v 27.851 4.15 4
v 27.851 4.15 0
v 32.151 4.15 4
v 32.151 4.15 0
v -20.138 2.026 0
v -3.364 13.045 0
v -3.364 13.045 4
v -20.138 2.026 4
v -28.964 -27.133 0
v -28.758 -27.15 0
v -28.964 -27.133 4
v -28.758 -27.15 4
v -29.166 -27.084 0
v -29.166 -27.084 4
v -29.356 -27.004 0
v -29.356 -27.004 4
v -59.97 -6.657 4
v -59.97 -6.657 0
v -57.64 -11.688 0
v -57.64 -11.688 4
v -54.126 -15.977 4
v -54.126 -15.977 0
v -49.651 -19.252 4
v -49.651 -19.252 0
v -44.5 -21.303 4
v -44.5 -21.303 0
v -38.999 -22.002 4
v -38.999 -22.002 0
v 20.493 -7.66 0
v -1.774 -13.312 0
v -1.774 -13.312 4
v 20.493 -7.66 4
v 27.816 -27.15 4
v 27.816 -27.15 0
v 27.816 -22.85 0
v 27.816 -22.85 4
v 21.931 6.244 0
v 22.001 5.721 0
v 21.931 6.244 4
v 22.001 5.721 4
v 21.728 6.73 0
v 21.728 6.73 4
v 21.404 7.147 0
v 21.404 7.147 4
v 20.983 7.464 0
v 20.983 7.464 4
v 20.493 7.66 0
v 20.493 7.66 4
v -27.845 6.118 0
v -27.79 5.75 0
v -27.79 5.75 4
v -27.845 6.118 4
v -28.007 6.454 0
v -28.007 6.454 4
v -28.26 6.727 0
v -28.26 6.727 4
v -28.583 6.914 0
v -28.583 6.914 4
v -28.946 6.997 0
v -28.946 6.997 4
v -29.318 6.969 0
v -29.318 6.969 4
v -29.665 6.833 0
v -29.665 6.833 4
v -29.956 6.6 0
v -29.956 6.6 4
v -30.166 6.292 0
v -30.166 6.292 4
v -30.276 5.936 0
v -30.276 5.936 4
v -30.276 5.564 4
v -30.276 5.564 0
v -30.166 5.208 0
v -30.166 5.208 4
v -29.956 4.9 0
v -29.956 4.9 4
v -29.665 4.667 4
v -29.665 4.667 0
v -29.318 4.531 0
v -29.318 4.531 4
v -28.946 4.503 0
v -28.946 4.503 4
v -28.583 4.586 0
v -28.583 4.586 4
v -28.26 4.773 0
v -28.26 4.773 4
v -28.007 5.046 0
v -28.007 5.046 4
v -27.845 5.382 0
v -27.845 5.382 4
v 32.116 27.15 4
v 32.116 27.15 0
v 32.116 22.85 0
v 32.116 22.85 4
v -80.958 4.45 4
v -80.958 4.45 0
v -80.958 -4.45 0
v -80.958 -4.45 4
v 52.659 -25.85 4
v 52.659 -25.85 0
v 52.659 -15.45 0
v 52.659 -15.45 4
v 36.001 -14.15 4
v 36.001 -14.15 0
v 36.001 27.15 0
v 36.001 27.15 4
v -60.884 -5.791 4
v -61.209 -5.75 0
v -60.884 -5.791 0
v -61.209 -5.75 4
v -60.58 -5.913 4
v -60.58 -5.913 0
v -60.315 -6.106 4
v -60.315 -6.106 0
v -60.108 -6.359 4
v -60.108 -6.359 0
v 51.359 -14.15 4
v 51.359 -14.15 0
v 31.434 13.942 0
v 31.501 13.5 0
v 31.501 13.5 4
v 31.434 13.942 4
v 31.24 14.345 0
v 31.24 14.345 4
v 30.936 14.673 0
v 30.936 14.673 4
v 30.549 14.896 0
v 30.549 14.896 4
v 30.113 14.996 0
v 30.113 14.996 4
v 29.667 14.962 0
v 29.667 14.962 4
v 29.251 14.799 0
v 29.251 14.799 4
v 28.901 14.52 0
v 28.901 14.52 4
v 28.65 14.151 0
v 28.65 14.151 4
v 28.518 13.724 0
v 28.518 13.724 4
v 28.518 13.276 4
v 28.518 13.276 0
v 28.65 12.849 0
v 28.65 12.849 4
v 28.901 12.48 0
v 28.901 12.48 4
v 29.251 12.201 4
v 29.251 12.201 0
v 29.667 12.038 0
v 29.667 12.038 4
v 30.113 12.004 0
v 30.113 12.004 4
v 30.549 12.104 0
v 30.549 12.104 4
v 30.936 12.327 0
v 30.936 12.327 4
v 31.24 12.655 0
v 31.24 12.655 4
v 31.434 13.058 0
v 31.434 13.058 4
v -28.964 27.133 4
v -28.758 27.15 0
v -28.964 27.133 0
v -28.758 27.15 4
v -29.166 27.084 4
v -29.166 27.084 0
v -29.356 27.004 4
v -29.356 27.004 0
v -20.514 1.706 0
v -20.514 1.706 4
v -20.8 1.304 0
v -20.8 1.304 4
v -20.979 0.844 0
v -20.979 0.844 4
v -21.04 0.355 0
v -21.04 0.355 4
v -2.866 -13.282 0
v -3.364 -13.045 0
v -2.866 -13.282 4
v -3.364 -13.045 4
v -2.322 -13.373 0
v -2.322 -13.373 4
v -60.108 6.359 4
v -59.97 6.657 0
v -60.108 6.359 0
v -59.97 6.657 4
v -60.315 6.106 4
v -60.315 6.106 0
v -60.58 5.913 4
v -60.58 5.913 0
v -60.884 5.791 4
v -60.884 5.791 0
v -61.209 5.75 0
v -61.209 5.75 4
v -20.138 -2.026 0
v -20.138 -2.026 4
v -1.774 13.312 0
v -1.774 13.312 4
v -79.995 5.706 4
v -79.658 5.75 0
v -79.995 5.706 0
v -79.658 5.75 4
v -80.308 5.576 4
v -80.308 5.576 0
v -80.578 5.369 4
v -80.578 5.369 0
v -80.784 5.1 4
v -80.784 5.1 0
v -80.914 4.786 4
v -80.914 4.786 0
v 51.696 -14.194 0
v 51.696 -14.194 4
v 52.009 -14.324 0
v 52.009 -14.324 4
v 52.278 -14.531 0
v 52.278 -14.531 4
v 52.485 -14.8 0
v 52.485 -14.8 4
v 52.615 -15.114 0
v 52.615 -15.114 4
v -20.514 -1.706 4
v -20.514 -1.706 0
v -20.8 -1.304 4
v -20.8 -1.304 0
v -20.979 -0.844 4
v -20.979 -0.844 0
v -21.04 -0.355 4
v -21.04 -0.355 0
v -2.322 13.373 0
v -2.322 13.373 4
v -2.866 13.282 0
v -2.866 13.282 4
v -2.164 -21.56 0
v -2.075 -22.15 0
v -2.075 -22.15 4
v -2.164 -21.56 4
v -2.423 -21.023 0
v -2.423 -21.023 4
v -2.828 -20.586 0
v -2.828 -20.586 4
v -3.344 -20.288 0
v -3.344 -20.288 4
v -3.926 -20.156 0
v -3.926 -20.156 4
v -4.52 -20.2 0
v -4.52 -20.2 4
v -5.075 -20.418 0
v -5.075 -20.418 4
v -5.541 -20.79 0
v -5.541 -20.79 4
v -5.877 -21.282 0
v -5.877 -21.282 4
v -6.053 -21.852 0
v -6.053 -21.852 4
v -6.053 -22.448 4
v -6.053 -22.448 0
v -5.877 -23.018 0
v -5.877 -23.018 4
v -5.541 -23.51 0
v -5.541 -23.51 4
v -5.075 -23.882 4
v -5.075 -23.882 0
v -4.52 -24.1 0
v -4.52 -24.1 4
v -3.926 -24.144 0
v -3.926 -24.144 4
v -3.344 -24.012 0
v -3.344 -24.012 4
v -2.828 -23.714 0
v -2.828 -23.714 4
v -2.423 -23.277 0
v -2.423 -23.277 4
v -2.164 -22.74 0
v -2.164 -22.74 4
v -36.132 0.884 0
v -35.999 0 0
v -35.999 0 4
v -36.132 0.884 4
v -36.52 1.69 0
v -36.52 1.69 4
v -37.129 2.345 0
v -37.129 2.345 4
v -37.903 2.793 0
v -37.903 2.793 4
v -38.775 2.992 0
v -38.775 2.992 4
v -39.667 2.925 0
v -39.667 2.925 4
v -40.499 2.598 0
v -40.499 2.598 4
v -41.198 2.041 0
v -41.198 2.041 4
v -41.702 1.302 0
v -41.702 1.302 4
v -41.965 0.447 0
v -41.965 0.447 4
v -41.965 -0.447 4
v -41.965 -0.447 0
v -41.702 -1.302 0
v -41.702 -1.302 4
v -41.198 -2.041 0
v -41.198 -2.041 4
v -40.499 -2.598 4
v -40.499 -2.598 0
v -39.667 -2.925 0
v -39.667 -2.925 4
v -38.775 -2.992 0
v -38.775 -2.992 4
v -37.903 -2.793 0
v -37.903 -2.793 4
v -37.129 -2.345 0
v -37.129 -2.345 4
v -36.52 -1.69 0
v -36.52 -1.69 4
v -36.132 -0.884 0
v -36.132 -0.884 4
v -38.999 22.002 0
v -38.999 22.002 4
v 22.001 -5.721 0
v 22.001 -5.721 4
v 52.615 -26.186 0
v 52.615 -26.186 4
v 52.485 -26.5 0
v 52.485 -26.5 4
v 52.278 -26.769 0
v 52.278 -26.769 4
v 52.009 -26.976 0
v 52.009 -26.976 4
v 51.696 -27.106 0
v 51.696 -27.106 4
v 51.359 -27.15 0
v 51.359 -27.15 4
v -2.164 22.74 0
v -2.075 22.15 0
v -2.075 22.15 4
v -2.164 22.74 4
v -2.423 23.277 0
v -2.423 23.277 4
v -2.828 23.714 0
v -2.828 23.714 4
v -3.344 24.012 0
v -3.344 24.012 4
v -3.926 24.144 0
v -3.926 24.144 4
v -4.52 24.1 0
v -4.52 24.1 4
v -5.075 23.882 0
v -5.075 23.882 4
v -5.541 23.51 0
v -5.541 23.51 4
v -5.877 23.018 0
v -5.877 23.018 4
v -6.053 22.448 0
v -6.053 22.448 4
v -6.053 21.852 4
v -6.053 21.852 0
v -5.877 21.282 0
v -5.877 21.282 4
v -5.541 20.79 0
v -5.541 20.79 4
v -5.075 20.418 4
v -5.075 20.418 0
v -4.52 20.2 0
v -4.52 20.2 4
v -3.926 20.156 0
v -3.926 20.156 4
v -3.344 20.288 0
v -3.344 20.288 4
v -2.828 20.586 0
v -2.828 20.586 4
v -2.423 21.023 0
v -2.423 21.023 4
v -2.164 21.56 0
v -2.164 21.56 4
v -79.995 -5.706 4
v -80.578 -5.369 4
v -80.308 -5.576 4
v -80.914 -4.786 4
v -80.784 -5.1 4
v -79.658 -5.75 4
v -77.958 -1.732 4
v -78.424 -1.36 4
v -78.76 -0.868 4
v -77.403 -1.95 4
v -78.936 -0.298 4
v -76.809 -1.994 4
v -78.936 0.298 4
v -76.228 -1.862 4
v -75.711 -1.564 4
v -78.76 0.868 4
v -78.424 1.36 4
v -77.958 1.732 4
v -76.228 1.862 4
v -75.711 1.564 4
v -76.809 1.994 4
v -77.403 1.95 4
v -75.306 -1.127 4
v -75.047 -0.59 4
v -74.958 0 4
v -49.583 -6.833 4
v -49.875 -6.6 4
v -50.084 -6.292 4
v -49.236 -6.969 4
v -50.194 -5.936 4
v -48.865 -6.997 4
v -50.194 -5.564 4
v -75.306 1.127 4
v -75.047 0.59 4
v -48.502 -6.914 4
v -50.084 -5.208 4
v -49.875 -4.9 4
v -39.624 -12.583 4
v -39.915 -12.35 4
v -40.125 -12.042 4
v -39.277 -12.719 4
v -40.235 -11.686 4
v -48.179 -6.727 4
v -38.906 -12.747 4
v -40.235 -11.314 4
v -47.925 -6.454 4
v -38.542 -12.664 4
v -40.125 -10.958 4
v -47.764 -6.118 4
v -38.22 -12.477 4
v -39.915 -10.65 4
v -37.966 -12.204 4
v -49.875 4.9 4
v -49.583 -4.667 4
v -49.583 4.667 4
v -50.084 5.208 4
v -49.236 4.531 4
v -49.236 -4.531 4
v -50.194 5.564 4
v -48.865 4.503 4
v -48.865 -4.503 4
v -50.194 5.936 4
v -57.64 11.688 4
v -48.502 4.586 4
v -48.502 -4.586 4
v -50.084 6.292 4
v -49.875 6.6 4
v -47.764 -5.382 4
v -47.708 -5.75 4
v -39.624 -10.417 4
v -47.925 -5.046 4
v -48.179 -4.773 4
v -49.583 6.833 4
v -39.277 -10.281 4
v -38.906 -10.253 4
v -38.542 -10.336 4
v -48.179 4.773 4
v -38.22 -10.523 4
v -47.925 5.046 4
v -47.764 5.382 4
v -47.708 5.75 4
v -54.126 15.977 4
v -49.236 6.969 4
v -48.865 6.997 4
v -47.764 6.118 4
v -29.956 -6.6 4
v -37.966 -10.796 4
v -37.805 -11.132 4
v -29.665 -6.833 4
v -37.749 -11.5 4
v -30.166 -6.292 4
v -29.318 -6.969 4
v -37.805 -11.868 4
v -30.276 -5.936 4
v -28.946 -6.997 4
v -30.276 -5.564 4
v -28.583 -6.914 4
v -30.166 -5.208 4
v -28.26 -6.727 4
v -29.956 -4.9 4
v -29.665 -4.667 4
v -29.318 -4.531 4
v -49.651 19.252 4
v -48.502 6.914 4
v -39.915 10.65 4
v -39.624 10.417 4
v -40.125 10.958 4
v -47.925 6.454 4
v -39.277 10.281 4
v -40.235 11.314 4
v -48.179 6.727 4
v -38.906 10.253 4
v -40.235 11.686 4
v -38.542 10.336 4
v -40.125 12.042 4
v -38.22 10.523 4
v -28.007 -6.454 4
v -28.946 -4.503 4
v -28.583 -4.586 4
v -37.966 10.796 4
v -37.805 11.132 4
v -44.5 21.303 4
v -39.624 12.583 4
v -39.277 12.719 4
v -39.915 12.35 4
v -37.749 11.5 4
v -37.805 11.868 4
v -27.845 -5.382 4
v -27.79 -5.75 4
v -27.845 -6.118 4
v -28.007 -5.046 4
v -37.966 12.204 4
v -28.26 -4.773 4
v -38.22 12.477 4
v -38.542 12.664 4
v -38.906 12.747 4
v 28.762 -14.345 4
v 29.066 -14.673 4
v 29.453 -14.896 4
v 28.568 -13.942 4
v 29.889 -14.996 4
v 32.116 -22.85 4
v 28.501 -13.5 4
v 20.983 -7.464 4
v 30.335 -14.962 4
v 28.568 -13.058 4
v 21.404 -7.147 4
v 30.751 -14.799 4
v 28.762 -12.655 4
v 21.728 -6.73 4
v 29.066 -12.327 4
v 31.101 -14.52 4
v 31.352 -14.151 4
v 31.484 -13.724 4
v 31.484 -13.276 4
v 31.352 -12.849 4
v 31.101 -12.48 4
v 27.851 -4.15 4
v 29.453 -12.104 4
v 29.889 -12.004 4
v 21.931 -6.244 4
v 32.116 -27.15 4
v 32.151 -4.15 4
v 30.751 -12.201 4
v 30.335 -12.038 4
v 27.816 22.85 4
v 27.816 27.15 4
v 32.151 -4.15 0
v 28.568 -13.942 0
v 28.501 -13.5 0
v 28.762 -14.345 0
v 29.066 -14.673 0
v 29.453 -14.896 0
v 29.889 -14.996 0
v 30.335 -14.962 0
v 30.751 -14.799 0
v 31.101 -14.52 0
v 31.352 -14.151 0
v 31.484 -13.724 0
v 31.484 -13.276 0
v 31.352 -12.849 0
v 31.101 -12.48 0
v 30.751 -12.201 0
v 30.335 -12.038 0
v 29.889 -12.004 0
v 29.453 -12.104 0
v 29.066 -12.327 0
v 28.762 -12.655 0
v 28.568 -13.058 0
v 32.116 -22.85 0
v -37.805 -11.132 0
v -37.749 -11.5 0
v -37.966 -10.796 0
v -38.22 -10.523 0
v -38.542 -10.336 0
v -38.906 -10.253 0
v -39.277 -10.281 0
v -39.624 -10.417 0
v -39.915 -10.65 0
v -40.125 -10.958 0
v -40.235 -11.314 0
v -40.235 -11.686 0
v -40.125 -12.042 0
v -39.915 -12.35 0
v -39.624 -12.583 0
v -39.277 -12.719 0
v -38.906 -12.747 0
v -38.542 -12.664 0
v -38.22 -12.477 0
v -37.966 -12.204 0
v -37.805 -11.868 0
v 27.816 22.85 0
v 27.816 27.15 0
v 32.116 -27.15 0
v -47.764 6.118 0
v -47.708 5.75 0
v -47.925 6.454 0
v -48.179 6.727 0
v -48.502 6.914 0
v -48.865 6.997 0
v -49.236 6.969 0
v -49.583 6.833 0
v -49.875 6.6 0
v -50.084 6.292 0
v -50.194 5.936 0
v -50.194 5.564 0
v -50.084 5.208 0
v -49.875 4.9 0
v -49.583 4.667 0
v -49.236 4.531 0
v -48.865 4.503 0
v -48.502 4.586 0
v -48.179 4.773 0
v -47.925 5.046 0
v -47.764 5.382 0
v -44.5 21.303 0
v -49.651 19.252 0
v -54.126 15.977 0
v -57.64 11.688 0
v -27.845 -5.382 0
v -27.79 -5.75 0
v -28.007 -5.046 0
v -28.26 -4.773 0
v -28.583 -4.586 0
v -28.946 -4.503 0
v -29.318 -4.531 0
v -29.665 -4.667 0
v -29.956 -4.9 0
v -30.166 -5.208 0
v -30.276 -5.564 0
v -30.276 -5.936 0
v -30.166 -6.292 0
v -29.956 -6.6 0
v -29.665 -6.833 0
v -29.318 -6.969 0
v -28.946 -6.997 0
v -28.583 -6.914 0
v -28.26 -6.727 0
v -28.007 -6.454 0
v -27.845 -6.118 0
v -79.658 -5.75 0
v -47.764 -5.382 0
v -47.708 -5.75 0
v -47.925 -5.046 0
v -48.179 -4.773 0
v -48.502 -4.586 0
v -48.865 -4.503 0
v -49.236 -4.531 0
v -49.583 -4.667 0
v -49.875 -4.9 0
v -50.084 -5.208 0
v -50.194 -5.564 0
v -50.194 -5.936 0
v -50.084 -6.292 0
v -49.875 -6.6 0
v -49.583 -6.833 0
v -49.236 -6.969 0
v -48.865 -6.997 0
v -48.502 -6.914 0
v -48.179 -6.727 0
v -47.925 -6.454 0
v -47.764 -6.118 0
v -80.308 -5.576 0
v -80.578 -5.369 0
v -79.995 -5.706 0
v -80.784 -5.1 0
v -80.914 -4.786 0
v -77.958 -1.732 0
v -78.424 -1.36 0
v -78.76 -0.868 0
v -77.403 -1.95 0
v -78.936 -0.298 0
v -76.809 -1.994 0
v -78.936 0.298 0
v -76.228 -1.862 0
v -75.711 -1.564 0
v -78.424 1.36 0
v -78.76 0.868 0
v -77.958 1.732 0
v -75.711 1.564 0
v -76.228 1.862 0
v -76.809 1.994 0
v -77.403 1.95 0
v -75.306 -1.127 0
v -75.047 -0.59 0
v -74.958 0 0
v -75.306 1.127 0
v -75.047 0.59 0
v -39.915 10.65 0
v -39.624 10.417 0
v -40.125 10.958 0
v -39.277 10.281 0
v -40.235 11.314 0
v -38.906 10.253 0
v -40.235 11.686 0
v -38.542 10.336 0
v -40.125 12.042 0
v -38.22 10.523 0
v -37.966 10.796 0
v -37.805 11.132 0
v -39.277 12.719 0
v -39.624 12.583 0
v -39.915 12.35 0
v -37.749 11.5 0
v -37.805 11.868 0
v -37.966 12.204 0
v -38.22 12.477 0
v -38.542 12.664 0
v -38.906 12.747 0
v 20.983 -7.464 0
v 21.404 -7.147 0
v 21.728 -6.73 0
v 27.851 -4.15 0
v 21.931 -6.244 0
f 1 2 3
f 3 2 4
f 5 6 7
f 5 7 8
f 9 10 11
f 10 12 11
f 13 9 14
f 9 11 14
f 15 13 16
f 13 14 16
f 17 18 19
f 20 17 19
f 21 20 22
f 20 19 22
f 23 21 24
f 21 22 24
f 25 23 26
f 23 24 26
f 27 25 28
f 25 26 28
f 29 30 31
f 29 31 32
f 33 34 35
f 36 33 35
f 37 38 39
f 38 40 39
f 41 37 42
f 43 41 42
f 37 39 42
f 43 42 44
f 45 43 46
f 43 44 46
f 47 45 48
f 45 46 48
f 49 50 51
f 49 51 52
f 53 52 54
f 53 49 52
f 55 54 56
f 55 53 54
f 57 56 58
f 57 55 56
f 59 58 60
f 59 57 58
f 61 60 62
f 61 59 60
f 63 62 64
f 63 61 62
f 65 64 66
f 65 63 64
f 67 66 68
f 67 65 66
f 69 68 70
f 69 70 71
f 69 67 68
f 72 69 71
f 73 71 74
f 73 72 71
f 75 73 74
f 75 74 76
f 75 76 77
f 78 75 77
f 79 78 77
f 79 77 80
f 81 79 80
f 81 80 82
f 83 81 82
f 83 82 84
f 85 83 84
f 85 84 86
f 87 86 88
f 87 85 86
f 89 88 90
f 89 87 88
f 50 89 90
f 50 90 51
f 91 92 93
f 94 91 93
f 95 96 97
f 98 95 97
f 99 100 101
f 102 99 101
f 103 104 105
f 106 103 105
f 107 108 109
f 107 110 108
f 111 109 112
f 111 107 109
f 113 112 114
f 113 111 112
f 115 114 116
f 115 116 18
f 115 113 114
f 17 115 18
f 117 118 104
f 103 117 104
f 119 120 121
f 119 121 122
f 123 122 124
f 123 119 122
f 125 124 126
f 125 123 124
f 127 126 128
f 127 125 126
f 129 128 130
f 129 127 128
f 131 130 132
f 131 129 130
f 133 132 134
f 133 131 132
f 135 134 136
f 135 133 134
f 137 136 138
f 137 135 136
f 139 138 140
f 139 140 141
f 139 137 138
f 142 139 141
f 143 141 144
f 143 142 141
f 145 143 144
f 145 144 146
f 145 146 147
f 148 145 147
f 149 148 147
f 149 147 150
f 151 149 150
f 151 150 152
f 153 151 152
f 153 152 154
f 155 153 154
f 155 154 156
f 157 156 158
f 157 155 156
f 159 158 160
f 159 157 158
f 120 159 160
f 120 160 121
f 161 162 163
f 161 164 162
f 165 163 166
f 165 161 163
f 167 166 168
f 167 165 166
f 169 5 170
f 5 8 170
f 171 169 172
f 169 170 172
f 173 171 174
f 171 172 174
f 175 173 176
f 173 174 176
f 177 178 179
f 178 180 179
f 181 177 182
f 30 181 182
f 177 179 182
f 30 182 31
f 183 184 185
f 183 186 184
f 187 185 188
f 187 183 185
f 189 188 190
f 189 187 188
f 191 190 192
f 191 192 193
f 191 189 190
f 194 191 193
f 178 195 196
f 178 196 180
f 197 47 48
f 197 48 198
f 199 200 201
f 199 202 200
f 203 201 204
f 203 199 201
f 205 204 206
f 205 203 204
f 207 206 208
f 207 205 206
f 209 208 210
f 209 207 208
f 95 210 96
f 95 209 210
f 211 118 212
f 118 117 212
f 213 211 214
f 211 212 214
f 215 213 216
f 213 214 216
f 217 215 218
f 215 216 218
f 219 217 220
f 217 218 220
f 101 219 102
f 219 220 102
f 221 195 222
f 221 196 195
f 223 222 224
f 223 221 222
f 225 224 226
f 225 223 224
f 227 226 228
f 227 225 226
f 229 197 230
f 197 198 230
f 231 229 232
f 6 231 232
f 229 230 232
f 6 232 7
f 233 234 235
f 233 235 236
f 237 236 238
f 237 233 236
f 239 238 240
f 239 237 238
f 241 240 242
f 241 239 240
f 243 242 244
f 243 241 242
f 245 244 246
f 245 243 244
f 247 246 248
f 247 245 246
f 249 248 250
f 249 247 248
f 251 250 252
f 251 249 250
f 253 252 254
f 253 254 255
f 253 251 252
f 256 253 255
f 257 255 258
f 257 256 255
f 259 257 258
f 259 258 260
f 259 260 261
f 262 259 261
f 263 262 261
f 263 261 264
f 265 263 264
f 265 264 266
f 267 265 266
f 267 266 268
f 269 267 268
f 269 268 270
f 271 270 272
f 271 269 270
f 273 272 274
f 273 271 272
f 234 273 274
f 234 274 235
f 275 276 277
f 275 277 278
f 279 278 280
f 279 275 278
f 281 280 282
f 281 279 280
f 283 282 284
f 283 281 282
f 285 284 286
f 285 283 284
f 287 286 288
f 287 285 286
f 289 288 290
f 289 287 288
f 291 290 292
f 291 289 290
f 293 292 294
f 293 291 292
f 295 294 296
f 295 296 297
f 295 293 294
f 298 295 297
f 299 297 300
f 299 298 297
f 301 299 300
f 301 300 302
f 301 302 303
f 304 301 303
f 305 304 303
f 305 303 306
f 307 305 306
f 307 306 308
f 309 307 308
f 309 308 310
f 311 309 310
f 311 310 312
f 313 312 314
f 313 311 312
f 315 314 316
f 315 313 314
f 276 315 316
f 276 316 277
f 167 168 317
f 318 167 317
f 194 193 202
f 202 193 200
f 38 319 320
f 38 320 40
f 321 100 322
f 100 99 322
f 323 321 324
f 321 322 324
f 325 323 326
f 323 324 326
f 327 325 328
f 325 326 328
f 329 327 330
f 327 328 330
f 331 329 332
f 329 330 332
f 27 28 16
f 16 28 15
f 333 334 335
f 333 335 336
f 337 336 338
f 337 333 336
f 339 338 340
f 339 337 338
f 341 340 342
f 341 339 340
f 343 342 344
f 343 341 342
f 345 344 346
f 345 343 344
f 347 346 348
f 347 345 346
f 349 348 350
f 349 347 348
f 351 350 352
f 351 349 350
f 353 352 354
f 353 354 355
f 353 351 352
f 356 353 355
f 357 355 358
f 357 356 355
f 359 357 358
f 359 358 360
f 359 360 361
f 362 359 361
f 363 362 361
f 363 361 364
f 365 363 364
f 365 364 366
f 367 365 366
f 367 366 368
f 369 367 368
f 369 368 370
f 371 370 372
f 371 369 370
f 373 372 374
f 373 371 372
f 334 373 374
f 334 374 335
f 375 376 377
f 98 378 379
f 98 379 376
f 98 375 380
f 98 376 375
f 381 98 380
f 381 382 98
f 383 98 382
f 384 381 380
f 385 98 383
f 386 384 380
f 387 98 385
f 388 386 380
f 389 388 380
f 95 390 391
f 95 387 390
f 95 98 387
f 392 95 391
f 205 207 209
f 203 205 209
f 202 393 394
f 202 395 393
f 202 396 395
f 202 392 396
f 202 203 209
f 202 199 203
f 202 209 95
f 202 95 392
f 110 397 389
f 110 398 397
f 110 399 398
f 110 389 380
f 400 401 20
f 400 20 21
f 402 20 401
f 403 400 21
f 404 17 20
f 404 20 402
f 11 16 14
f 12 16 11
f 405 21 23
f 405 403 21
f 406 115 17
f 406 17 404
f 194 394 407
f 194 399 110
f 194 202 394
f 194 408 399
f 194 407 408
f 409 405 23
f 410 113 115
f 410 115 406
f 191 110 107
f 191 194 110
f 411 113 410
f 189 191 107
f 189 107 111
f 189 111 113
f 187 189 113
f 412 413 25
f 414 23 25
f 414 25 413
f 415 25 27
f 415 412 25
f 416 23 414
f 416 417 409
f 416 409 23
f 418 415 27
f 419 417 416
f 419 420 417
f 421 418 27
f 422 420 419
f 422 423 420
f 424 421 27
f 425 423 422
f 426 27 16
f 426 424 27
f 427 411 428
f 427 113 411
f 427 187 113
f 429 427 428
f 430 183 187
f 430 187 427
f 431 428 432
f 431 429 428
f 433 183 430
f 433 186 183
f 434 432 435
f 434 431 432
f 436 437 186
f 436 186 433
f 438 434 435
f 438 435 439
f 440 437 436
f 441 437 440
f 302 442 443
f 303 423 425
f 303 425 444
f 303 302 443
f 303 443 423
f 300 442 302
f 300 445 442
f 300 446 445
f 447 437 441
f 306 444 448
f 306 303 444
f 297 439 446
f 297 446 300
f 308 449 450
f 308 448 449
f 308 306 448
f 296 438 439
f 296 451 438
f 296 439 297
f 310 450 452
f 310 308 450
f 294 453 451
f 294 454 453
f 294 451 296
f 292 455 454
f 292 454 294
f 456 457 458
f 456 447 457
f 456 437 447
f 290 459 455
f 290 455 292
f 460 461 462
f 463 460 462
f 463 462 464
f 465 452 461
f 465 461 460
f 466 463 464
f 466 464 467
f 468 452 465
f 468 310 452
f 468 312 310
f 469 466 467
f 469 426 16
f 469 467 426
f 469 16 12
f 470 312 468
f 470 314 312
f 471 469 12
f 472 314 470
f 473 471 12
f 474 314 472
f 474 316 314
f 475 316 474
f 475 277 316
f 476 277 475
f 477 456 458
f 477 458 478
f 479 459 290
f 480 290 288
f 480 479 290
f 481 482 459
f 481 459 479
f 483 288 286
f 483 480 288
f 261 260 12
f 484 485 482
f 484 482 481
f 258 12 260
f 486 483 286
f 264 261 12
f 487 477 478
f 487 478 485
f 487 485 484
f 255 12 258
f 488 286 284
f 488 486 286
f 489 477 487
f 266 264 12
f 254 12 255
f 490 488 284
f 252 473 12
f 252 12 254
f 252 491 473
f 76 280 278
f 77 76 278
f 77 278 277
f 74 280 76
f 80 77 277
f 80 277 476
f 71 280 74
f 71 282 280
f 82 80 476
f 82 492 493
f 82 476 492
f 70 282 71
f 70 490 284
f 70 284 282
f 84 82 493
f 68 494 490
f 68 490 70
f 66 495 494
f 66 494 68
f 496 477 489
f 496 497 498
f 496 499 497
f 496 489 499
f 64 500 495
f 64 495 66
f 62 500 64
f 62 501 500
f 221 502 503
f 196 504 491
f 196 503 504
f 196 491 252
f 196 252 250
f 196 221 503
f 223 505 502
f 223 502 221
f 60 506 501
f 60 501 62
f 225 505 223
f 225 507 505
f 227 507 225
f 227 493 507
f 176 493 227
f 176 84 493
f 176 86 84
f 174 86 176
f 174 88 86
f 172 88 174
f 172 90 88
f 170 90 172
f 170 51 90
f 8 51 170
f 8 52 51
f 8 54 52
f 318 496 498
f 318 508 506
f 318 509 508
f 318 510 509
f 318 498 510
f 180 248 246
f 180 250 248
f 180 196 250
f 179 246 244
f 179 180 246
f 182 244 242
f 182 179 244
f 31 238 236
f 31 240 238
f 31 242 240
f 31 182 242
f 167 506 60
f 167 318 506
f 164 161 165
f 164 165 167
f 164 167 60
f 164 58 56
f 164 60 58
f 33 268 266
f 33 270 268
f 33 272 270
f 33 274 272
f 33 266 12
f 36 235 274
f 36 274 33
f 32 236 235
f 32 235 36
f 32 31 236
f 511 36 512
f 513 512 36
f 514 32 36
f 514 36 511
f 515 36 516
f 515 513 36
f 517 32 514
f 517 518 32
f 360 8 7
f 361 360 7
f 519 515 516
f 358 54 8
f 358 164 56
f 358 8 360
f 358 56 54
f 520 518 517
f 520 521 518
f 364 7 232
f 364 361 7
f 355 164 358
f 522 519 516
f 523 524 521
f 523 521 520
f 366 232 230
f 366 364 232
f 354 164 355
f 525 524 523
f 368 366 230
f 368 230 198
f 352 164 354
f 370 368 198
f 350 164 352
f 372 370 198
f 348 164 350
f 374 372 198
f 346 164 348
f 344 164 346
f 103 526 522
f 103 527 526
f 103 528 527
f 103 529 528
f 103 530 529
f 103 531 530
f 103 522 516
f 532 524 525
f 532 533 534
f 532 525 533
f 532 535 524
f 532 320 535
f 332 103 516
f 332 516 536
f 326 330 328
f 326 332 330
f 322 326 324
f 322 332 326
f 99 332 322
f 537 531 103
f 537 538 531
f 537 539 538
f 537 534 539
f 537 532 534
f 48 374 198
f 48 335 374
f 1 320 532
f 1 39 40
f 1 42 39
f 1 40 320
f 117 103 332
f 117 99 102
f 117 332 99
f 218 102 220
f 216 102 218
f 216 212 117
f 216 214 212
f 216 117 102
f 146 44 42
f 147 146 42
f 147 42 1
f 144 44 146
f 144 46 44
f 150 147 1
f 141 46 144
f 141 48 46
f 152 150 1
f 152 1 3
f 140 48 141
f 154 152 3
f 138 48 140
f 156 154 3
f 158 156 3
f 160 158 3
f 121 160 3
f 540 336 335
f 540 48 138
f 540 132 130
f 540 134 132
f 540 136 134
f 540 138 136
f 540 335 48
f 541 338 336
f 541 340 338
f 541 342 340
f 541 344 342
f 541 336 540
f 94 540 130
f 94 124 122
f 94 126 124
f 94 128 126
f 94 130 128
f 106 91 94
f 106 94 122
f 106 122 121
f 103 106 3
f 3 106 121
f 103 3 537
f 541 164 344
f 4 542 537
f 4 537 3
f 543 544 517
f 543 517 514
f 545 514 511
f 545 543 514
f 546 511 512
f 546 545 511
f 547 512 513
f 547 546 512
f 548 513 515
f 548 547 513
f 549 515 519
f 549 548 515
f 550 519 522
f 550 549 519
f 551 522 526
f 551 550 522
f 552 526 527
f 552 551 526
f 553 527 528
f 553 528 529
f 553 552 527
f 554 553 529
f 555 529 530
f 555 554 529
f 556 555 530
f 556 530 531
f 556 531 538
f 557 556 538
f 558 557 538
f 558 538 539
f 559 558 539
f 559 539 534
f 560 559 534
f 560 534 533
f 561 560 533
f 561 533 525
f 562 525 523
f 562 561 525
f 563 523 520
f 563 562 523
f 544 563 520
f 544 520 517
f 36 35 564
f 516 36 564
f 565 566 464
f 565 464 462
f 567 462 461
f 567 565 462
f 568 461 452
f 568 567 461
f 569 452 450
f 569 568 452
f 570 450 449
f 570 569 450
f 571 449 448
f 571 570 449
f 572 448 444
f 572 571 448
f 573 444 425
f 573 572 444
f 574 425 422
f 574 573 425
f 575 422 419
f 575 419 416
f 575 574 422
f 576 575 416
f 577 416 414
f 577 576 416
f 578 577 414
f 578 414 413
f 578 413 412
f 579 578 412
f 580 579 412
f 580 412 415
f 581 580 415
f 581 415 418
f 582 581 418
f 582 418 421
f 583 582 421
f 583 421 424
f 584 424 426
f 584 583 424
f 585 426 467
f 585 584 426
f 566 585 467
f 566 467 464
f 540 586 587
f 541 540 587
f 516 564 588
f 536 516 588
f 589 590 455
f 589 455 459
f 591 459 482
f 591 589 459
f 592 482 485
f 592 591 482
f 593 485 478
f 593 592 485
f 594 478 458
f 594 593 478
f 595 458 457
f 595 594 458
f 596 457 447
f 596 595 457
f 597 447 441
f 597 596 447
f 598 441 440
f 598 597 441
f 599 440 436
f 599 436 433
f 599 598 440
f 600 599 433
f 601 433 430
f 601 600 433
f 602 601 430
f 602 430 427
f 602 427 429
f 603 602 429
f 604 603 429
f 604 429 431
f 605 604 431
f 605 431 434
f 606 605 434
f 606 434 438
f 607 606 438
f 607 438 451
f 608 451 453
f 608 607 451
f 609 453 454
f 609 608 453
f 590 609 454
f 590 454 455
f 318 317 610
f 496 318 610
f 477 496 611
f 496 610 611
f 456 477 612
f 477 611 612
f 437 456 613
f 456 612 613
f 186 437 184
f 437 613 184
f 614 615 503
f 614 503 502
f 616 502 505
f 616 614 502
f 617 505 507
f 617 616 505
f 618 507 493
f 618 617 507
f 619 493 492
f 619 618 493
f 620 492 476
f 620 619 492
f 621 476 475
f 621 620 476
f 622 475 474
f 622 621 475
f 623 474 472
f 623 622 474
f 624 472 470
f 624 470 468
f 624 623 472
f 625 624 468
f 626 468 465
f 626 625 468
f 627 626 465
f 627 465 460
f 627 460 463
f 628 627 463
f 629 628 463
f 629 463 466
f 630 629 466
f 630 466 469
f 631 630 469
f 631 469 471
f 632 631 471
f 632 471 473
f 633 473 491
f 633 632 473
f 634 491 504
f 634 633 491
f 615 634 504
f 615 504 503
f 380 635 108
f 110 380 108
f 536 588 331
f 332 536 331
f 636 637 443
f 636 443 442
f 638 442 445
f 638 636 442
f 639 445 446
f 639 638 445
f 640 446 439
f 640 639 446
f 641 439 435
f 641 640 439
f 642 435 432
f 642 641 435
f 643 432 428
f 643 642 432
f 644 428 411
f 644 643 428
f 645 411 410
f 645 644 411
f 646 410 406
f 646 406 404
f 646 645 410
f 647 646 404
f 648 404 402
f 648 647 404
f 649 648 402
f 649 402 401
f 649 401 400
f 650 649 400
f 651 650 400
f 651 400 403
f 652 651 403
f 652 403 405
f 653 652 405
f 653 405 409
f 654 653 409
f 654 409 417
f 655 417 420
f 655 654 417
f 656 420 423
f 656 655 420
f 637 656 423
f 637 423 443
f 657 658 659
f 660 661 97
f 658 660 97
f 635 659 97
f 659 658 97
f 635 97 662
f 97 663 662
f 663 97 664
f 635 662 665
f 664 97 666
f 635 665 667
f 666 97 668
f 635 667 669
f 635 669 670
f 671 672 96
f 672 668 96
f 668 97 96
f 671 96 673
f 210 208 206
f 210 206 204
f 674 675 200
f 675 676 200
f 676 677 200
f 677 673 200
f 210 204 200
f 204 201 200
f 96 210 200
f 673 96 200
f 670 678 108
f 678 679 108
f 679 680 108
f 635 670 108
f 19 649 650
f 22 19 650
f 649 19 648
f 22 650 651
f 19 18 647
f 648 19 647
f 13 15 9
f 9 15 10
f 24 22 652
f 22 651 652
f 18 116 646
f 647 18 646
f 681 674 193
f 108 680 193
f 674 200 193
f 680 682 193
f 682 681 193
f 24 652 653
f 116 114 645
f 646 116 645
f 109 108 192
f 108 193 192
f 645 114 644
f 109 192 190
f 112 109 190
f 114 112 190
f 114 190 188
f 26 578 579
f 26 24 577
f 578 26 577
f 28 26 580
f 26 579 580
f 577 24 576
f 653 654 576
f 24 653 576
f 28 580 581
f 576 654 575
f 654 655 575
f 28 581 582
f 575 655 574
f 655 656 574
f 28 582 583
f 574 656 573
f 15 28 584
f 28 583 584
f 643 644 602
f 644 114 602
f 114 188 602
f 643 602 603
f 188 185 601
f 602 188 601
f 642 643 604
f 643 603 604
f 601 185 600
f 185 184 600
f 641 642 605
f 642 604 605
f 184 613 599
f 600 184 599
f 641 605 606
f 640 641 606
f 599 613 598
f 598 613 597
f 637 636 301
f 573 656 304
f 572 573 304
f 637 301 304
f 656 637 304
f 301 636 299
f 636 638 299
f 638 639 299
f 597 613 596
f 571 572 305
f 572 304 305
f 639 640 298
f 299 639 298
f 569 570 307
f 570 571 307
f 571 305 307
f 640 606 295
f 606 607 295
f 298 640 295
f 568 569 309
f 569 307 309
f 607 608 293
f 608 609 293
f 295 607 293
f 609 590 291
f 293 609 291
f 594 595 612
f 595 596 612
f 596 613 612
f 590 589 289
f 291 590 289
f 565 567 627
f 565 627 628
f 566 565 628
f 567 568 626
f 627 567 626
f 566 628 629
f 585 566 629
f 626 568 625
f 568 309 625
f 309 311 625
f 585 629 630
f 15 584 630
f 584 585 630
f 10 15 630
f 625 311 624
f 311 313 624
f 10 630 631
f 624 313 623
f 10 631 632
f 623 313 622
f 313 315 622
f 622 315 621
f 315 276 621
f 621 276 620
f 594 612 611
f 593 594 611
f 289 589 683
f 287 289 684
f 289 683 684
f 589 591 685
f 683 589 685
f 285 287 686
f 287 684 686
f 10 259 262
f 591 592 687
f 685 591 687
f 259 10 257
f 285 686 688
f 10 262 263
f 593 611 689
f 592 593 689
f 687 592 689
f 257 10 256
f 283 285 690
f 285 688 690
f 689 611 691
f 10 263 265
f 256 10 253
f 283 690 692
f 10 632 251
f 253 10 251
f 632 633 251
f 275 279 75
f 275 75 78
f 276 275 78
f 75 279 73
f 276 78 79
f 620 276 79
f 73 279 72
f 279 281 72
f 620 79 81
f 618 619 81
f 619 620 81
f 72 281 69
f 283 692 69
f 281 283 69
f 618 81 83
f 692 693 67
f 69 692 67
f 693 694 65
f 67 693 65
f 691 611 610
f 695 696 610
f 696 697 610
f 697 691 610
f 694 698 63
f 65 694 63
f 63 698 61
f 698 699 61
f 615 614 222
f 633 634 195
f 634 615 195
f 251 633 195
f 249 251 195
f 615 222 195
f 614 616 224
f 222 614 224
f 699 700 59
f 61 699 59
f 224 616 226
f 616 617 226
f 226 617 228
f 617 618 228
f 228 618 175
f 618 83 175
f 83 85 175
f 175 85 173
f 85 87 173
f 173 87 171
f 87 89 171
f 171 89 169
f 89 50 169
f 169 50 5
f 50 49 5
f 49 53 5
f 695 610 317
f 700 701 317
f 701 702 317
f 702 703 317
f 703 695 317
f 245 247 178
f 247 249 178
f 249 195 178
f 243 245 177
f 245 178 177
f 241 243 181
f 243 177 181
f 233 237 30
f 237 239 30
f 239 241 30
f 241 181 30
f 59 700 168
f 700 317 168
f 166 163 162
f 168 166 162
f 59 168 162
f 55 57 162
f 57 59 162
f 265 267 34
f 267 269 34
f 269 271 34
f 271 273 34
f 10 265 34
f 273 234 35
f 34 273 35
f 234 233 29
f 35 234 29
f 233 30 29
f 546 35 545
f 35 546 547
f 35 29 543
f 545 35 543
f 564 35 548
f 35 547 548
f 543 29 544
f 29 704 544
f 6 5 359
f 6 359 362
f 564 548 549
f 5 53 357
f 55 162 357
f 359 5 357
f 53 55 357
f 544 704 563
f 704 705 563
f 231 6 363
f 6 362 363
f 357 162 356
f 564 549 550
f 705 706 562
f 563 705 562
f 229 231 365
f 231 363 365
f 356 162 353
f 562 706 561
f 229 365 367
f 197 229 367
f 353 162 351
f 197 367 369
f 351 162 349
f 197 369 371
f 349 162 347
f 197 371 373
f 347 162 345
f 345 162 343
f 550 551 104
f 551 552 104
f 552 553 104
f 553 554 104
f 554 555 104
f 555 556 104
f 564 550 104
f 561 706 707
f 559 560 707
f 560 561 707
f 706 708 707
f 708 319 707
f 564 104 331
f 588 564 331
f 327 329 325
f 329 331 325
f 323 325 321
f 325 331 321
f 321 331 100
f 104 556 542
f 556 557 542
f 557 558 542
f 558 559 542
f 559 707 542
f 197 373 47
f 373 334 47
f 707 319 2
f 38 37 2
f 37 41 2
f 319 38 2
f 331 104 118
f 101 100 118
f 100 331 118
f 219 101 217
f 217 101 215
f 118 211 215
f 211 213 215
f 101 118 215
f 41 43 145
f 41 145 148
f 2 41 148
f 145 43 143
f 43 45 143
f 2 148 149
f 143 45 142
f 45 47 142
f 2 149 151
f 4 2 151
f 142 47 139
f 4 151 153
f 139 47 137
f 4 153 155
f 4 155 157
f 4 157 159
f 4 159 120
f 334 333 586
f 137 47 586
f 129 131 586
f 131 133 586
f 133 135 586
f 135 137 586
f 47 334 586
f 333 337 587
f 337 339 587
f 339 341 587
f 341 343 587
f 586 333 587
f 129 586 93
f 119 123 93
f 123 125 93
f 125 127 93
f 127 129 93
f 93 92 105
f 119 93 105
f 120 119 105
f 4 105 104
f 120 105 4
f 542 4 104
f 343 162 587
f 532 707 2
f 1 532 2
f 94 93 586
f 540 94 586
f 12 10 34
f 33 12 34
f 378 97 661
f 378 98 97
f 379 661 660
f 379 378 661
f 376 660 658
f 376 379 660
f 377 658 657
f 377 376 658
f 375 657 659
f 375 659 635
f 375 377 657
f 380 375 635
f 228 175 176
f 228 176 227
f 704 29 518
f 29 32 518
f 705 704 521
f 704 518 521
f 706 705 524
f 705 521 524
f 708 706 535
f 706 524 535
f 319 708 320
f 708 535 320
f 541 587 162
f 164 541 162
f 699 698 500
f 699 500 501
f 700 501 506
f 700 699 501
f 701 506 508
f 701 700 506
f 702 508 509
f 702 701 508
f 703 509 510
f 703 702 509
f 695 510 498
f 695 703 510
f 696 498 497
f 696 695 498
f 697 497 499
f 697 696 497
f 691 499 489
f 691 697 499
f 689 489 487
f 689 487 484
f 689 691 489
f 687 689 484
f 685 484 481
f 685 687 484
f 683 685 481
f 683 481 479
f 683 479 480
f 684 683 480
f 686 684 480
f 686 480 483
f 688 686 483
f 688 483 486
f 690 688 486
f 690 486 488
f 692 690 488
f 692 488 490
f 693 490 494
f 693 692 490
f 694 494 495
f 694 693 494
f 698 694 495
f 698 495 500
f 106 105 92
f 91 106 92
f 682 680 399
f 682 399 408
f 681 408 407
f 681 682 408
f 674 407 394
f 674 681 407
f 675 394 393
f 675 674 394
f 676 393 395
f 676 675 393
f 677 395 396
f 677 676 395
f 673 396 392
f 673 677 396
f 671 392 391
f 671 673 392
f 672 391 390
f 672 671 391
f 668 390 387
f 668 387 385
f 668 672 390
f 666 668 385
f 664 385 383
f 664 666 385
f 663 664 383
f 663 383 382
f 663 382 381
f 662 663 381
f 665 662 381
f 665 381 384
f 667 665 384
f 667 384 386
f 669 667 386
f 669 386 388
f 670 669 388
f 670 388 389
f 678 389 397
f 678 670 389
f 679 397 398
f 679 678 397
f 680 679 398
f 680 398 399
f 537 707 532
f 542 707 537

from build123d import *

# Parameters (mm, degrees)
SKETCH_1_R      = 1.5
SKETCH_1_R_2    = 3
SKETCH_1_R_3    = 1.25
SKETCH_1_R_4    = 2
SKETCH_1_W      = 4.3
SKETCH_1_H      = 8.3
EXTRUDE_1_DEPTH = 4
FILLET_1_R      = 1.3
FILLET_2_R      = 2


with BuildPart() as part:
    # 草图1 → 凸台-拉伸1 (new body)
    with BuildSketch(Plane.XY):
        with BuildLine():
            Line((32.115707856, 27.15), (32.115707856, 22.85))
            Line((32.115707856, 22.85), (27.815707856, 22.85))
            Line((27.815707856, 22.85), (27.815707856, 27.15))
            Line((27.815707856, 27.15), (-29.075, 27.15))
            Line((-29.075, 27.15), (-38.998995168, 22.002009663))
            ThreePointArc((-38.998995168, 22.002009663), (-52.370174504, 17.472835843), (-60.236366221, 5.75))
            Line((-60.236366221, 5.75), (-80.958287312, 5.75))
            Line((-80.958287312, 5.75), (-80.958287312, -5.75))
            Line((-80.958287312, -5.75), (-60.236366221, -5.75))
            ThreePointArc((-60.236366221, -5.75), (-52.370174504, -17.472835843), (-38.998995168, -22.002009663))
            Line((-38.998995168, -22.002009663), (-29.075, -27.15))
            Line((-29.075, -27.15), (27.815707856, -27.15))
            Line((27.815707856, -27.15), (27.815707856, -22.85))
            Line((27.815707856, -22.85), (32.115707856, -22.85))
            Line((32.115707856, -22.85), (32.115707856, -27.15))
            Line((32.115707856, -27.15), (36.001004832, -27.15))
            Line((36.001004832, -27.15), (52.659242152, -27.15))
            Line((52.659242152, -27.15), (52.659242152, -14.15))
            Line((52.659242152, -14.15), (36.001004832, -14.15))
            Line((36.001004832, -14.15), (36.001004832, 27.15))
            Line((36.001004832, 27.15), (32.115707856, 27.15))
        make_face()
        with Locations((30.001004832, 13.5)):
            Circle(SKETCH_1_R, mode=Mode.SUBTRACT)
        with Locations(Location((30.001004832, -13.5, 0), (0, 0, 180))):
            Circle(SKETCH_1_R, mode=Mode.SUBTRACT)
        with Locations((-38.998995168, 0)):
            Circle(SKETCH_1_R_2, mode=Mode.SUBTRACT)
        with Locations((-38.998995168, -11.5)):
            Circle(SKETCH_1_R_3, mode=Mode.SUBTRACT)
        with Locations((-48.958287312, -5.75)):
            Circle(SKETCH_1_R_3, mode=Mode.SUBTRACT)
        with Locations((-48.958287312, 5.75)):
            Circle(SKETCH_1_R_3, mode=Mode.SUBTRACT)
        with Locations((-38.998995168, 11.5)):
            Circle(SKETCH_1_R_3, mode=Mode.SUBTRACT)
        with Locations((-29.039703025, 5.75)):
            Circle(SKETCH_1_R_3, mode=Mode.SUBTRACT)
        with Locations((-29.039703025, -5.75)):
            Circle(SKETCH_1_R_3, mode=Mode.SUBTRACT)
        with Locations((-4.075, -22.15)):
            Circle(SKETCH_1_R_4, mode=Mode.SUBTRACT)
        with Locations((-4.075, 22.15)):
            Circle(SKETCH_1_R_4, mode=Mode.SUBTRACT)
        with Locations((-76.958287312, 0)):
            Circle(SKETCH_1_R_4, mode=Mode.SUBTRACT)
        with Locations((30.001004832, 0)):
            Rectangle(SKETCH_1_W, SKETCH_1_H, mode=Mode.SUBTRACT)
        Polygon((-21.039703025, -1.433615613), (-2.627787708, -13.528909152), (22.001004832, -7.277030256), (22.001004832, 7.277030256), (-2.627787708, 13.528909152), (-21.039703025, 1.433615613), align=None, mode=Mode.SUBTRACT)
    extrude(amount=EXTRUDE_1_DEPTH)

    # 圆角1
    fillet_1_edges = [part.edges().sort_by_distance(p)[0] for p in [
        (-29.075, -27.15, 2),
        (-60.236366221, -5.75, 2),
        (-80.958287312, -5.75, 2),
        (-80.958287312, 5.75, 2),
        (-60.236366221, 5.75, 2),
        (-29.075, 27.15, 2),
        (52.659242152, -14.15, 2),
        (52.659242152, -27.15, 2),
    ]]
    fillet(fillet_1_edges, radius=FILLET_1_R)

    # 圆角2
    fillet_2_edges = [part.edges().sort_by_distance(p)[0] for p in [
        (-21.039703025, 1.433615613, 2),
        (-21.039703025, -1.433615613, 2),
        (-2.627787708, -13.528909152, 2),
        (22.001004832, -7.277030256, 2),
        (22.001004832, 7.277030256, 2),
        (-2.627787708, 13.528909152, 2),
    ]]
    fillet(fillet_2_edges, radius=FILLET_2_R)


solid = part.part
